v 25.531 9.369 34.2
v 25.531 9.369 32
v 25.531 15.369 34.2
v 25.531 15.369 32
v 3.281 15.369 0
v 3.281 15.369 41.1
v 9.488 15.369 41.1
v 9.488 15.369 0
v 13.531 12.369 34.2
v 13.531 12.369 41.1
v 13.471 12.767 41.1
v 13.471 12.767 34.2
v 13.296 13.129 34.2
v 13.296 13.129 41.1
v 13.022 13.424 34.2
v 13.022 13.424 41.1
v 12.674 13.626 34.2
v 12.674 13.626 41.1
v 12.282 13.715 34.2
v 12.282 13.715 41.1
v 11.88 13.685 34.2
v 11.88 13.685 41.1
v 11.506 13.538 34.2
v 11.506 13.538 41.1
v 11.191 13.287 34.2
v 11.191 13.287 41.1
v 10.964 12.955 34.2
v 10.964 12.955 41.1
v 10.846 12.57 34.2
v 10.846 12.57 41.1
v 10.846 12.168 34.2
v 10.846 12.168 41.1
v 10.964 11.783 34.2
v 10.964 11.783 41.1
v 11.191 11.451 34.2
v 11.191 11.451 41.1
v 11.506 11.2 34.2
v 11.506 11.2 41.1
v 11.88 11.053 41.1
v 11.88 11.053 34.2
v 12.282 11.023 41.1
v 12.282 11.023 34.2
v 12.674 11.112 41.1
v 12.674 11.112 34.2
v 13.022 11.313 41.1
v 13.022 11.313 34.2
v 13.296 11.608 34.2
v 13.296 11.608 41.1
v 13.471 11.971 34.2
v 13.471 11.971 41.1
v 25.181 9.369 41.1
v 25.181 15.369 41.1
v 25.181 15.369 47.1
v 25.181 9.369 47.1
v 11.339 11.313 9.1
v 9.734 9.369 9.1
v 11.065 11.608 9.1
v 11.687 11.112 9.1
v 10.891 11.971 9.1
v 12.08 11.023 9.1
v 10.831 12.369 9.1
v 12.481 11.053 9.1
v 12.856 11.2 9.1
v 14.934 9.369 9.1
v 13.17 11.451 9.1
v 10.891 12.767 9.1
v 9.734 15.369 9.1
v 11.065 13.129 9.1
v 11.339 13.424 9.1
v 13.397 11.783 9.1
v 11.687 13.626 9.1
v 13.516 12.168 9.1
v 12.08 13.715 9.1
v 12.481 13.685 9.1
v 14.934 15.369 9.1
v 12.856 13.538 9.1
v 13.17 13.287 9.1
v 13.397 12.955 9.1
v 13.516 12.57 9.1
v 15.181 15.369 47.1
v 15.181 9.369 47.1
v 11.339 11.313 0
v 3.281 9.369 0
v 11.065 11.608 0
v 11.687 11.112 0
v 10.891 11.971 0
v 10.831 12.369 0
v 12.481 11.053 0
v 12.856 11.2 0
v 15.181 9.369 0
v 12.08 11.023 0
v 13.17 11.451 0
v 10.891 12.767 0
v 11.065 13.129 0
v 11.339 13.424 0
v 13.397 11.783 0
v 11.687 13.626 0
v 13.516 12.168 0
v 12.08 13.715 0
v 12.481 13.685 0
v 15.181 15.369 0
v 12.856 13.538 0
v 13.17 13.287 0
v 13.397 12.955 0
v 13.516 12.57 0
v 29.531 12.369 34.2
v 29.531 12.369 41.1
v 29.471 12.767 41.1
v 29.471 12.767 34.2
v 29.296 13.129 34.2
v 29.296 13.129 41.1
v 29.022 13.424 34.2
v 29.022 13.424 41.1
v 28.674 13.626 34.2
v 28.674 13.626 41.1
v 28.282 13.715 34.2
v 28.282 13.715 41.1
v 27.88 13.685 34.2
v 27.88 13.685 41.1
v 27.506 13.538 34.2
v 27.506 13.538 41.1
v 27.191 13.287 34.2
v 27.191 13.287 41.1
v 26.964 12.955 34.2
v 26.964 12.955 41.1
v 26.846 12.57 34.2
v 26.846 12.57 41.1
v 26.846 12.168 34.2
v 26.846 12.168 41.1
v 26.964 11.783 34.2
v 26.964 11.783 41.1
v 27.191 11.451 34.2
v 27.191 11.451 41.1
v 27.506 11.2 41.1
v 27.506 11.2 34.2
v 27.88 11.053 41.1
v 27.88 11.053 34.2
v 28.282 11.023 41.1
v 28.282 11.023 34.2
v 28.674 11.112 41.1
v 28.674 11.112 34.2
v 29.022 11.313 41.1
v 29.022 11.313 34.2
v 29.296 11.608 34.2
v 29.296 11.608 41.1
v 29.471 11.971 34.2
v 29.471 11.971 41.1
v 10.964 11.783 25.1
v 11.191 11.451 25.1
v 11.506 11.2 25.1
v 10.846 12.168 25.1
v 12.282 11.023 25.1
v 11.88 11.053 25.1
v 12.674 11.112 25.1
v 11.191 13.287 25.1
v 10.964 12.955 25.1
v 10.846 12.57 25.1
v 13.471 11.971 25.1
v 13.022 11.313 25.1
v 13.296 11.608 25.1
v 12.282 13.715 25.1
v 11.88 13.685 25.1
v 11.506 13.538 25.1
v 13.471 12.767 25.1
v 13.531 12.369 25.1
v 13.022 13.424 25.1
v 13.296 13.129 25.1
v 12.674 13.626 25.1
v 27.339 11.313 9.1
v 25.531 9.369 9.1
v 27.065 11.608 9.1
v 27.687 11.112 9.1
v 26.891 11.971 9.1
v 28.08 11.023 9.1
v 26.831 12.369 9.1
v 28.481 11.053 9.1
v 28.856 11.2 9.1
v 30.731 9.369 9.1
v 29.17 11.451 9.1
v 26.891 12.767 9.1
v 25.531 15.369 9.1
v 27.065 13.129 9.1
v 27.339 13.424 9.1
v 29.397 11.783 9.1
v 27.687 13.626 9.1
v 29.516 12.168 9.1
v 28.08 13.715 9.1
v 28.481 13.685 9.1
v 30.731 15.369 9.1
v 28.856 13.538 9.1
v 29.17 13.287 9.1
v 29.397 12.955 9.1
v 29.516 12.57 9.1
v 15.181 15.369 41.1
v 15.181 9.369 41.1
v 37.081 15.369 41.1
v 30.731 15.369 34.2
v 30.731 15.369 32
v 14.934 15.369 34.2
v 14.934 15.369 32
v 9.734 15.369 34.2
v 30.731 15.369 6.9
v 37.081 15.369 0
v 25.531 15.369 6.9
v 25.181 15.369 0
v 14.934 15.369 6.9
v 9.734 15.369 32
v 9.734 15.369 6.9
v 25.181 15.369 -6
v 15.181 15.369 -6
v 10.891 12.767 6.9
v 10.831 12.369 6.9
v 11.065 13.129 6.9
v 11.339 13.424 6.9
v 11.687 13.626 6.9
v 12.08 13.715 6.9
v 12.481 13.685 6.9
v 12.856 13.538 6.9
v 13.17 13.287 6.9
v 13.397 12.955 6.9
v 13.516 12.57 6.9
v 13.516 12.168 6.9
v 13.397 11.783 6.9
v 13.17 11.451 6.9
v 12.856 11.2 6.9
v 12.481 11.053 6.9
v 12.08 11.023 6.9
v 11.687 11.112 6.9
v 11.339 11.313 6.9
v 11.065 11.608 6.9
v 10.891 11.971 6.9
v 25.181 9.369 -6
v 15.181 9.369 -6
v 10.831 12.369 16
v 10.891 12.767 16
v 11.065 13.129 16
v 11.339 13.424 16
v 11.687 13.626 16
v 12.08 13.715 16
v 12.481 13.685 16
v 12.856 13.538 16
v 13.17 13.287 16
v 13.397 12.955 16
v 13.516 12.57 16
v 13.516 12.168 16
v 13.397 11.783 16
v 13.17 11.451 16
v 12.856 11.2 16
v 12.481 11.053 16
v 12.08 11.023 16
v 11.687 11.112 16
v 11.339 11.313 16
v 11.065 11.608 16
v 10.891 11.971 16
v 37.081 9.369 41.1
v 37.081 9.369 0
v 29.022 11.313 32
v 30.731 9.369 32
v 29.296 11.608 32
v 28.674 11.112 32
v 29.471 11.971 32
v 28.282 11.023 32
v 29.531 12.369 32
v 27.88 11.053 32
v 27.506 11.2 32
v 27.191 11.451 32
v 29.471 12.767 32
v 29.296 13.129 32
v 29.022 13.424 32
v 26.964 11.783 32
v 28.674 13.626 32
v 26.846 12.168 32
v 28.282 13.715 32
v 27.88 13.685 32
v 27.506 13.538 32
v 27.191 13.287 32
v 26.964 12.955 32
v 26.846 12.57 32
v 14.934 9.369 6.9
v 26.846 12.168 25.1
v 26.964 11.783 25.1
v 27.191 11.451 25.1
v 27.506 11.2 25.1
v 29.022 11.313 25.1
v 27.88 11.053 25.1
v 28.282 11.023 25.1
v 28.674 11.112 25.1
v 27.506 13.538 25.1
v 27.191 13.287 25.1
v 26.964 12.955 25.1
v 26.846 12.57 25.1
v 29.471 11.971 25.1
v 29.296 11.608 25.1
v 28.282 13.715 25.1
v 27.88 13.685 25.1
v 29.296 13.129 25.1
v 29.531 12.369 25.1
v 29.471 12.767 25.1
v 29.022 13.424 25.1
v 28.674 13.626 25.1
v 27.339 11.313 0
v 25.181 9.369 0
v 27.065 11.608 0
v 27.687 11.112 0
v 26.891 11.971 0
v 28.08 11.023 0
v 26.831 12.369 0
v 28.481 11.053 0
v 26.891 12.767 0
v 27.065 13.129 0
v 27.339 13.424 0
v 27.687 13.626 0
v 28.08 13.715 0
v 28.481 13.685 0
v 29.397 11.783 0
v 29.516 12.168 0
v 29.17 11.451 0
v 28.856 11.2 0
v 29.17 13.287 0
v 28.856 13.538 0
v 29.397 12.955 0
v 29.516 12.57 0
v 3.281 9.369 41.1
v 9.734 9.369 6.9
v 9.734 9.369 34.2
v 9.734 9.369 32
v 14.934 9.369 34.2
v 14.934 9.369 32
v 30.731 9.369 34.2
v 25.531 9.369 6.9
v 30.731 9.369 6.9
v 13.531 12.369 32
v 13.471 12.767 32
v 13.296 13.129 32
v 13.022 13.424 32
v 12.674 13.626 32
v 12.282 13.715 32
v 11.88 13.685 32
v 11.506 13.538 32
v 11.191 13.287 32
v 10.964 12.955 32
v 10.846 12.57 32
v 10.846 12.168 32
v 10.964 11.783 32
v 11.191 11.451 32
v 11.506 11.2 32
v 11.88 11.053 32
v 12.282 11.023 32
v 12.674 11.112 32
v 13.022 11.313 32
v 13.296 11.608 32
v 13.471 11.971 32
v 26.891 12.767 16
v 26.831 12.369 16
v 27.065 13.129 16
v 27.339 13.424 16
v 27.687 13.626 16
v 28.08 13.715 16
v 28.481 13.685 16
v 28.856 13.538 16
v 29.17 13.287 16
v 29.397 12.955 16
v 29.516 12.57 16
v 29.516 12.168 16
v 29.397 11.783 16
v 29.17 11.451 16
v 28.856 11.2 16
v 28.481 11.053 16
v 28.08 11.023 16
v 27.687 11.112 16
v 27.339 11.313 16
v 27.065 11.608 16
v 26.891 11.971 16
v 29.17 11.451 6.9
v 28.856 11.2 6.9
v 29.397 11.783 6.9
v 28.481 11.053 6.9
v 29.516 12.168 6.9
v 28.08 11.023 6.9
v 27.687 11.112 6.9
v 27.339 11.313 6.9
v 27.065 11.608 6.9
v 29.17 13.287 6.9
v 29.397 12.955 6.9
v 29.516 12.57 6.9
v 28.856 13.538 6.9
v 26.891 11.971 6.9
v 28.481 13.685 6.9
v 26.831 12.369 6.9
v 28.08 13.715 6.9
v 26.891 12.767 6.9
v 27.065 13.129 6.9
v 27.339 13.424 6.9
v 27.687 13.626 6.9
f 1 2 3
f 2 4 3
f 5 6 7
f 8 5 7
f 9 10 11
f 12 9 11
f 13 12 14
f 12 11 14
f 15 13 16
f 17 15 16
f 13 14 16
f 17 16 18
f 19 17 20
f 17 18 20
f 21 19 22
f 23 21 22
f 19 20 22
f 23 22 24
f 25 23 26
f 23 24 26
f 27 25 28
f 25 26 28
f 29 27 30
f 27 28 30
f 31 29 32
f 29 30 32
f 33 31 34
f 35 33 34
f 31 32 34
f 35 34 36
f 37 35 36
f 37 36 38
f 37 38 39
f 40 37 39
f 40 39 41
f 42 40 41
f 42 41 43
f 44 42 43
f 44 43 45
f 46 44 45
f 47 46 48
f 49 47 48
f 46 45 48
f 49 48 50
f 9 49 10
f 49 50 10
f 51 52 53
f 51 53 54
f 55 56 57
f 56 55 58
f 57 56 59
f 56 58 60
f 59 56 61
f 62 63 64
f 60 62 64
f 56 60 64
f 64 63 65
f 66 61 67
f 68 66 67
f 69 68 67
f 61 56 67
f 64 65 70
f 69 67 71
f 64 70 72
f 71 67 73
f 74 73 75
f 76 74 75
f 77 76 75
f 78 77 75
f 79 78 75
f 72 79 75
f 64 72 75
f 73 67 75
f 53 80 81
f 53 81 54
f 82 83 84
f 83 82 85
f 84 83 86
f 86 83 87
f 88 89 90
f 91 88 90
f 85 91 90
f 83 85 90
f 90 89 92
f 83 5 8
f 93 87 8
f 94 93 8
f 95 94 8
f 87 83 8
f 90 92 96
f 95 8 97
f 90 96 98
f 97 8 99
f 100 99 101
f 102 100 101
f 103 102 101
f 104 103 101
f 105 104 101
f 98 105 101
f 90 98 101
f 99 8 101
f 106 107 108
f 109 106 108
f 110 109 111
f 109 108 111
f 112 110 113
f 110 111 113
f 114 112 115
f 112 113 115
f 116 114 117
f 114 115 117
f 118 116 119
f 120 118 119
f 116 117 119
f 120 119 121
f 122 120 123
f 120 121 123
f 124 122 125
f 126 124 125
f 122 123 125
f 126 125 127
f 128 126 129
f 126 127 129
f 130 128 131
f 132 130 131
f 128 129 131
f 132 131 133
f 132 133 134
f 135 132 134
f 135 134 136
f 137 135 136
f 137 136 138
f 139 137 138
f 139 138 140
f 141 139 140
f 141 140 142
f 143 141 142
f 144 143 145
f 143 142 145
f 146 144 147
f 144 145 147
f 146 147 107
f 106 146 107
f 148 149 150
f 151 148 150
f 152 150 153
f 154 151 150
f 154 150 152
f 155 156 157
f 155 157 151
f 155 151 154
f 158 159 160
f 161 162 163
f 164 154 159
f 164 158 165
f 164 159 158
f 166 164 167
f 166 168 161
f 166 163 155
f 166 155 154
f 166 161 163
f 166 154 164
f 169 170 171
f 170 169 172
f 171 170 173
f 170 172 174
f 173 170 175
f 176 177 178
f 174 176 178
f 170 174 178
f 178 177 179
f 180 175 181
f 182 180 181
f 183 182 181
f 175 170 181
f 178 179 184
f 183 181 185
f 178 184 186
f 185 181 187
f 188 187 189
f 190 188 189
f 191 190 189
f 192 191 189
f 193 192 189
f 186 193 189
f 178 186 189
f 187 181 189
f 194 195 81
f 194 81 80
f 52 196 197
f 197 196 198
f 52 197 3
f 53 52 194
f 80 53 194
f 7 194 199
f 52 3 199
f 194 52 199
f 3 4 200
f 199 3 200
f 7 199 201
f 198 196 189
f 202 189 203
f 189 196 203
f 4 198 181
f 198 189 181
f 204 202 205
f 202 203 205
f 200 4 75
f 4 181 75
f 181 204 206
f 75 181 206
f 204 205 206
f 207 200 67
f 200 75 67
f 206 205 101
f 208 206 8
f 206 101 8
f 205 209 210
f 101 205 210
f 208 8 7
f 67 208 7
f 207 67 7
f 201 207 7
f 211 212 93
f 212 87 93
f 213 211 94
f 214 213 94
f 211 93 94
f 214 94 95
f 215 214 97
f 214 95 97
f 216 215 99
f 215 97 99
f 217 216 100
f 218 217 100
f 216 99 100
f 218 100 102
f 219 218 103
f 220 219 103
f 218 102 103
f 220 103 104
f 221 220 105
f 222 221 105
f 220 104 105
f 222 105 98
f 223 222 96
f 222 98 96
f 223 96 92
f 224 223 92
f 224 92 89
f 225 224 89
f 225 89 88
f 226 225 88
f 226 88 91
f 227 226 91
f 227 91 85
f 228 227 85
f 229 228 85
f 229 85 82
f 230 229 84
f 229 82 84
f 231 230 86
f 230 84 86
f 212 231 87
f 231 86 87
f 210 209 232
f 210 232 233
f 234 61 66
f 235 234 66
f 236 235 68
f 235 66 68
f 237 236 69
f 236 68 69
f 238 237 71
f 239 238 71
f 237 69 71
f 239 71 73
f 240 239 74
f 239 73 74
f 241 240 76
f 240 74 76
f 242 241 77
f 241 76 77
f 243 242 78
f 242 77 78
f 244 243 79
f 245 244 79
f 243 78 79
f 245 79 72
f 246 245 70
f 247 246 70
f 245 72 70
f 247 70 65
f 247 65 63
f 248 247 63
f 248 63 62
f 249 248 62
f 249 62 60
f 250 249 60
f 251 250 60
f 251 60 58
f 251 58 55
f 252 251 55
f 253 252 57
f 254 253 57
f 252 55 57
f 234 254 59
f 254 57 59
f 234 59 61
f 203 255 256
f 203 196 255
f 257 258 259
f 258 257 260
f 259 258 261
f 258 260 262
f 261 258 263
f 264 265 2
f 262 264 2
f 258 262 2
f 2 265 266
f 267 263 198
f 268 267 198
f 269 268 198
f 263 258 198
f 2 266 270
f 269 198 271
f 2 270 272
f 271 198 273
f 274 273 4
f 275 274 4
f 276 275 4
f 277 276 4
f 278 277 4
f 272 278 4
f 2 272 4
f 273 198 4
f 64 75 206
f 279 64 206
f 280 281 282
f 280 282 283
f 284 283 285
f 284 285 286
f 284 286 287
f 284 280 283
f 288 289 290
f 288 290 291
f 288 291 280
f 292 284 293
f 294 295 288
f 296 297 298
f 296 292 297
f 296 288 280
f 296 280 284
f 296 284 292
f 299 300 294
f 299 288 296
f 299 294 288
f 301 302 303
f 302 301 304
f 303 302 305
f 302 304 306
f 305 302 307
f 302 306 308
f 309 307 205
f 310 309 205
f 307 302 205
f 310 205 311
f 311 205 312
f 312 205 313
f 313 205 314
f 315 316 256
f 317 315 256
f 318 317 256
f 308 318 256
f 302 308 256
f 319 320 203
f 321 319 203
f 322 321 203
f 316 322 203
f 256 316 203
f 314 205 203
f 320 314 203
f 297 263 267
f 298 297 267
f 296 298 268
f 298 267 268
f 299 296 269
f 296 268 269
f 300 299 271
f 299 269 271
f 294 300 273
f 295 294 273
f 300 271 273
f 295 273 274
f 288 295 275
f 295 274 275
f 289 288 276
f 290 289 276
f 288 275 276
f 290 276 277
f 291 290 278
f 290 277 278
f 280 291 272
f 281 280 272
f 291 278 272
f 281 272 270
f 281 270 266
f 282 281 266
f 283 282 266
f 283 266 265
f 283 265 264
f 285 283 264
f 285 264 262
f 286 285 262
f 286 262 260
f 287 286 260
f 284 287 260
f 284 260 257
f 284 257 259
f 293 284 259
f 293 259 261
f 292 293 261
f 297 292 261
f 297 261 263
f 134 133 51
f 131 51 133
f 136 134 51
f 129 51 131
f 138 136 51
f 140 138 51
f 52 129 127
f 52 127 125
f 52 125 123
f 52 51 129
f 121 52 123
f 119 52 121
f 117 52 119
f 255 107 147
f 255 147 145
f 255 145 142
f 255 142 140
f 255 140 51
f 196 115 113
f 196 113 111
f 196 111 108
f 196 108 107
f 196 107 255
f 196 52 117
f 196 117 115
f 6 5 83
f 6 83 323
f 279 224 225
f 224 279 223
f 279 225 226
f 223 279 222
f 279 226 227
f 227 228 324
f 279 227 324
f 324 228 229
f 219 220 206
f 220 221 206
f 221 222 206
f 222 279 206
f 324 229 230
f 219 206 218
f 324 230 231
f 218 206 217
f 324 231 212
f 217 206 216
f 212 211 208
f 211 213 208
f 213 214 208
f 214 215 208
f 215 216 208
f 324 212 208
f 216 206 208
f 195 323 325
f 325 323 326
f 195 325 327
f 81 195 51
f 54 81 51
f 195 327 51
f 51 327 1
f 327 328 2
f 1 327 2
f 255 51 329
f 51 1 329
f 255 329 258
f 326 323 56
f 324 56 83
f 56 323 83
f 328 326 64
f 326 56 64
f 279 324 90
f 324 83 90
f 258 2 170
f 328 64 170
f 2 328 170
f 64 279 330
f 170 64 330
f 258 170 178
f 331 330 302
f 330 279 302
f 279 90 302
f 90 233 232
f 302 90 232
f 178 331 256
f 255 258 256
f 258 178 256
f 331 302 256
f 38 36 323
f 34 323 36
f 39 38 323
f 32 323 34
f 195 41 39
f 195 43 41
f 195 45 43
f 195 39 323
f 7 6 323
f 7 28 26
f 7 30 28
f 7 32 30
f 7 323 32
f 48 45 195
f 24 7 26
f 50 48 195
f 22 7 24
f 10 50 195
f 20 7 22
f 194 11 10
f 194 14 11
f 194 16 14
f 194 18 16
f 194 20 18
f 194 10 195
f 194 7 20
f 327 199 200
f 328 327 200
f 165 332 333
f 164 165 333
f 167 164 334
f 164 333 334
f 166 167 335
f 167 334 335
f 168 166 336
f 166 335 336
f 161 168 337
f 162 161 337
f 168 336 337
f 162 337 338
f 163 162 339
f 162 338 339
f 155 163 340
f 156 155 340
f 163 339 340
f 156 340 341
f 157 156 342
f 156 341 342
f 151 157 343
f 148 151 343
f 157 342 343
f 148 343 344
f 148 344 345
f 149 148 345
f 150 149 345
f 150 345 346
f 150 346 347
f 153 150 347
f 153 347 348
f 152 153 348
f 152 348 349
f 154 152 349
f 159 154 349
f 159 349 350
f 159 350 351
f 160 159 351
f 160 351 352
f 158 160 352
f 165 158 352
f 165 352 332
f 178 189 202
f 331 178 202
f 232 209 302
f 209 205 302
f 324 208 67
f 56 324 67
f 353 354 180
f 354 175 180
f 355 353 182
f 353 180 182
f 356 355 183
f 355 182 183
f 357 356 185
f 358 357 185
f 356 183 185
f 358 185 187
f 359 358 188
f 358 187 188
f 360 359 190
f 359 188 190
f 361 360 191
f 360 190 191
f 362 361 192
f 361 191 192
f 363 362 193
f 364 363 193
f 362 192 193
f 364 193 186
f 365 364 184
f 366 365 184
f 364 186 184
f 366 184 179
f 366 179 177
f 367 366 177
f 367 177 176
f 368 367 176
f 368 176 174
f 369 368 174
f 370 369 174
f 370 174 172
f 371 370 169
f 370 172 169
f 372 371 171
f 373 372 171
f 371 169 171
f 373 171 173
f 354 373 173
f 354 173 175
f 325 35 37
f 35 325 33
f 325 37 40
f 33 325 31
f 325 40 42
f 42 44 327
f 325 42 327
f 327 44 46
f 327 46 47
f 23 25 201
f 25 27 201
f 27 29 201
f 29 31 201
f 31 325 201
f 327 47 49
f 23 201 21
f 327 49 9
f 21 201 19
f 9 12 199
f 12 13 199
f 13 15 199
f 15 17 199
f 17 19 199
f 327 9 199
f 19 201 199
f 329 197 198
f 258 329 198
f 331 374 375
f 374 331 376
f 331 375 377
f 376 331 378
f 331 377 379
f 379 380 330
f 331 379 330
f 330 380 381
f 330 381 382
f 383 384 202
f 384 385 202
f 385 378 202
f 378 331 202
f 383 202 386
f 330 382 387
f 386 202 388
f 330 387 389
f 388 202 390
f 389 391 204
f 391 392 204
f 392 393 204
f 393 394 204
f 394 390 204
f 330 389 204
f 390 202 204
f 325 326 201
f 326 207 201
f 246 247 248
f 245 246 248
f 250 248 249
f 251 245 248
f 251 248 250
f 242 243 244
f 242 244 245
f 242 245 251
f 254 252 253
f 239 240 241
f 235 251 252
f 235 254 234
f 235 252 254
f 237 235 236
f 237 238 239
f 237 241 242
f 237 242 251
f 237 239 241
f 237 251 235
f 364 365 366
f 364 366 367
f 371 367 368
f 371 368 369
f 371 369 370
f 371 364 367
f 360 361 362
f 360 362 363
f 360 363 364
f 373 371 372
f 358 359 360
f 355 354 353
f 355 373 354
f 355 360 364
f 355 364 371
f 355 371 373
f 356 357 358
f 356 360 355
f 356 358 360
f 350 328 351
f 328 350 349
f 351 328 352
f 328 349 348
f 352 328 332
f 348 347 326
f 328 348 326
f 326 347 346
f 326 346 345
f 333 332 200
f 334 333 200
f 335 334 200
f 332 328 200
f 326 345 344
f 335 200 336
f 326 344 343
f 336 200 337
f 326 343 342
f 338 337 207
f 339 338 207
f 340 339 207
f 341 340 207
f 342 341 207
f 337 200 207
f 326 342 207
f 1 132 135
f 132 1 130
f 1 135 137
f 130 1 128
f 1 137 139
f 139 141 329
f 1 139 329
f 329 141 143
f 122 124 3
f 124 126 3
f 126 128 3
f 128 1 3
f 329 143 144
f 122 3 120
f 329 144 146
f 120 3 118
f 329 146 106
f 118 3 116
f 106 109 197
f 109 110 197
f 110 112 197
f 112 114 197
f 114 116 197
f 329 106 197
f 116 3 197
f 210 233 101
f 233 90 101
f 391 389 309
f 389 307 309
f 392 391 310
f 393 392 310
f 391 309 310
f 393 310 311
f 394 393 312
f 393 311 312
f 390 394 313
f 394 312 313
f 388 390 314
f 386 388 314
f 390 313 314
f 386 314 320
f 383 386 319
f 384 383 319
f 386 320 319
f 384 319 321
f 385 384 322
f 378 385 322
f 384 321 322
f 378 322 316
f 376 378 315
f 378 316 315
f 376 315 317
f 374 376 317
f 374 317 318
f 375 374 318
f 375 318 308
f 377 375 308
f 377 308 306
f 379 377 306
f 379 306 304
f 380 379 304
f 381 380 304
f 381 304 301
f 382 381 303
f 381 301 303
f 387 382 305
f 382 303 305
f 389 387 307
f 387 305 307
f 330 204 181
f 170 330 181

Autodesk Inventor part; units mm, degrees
ref_plane "YZ Plane" through (0, 0, 0) normal (1, 0, 0) x (0, 1, 0)
ref_plane "XZ Plane" through (0, 0, 0) normal (0, 1, 0) x (-1, 0, 0)
ref_plane "XY Plane" through (0, 0, 0) normal (0, 0, 1) x (1, 0, 0)
sketch "스케치8" plane through (0, 0, 0) normal (0, 0, 1) x (1, 0, 0)
  circle A0 centre (12.1807, -22.6311) radius 1.2
  arc A1 (9.2807, -22.6311) -> (14.3807, -22.6311) centre (11.8307, -22.1236) ccw
  circle A2 centre (14.5238, -16.9742) radius 1.2
  circle A3 centre (20.1807, -14.6311) radius 1.2
  circle A4 centre (25.8375, -16.9742) radius 1.2
  circle A5 centre (28.1807, -22.6311) radius 1.2
  arc A6 (25.9807, -22.6311) -> (31.0807, -22.6311) centre (28.5307, -22.1236) ccw
  line L0 (9.2807, -22.6311) -> (31.0807, -22.6311)
  line L1 (9.2807, -2.6311) -> (9.2807, -22.6311)
  line L2 (31.0807, -22.6311) -> (31.0807, -2.6311)
  circle A7 centre (20.1807, -22.6311) radius 5.8
  line L3 (9.2807, -2.6311) -> (39.0379, -2.6311) construction
  line L4 (31.0807, -2.6311) -> (31.0807, 12.3689)
  line L5 (31.0807, 12.3689) -> (9.2807, 12.3689)
  line L6 (9.2807, 12.3689) -> (9.2807, -2.6311)
  line L7 (9.2807, 12.3689) -> (9.2807, 12.3689)
  line L8 (31.0807, 12.3689) -> (31.0807, 12.3689)
  line L9 (31.0807, 12.3689) -> (46.4956, 27.7838)
  arc A8 (46.4956, 27.7838) -> (9.2807, 12.3689) centre (31.0807, 12.3689) ccw
  arc A9 (15.2617, -2.6311) -> (15.6657, -3.046) centre (31.0807, 12.3689) ccw
  line L10 (15.1807, 15.3689) -> (25.1807, 15.3689)
  line L11 (25.1807, 15.3689) -> (25.1807, 9.3689)
  line L12 (25.1807, 9.3689) -> (15.1807, 9.3689)
  line L13 (15.1807, 9.3689) -> (15.1807, 15.3689)
  line L14 (15.1807, 15.3689) -> (25.1807, 9.3689) construction
  line L15 (25.1807, 15.3689) -> (15.1807, 9.3689) construction
  circle A10 centre (12.1807, 12.3689) radius 1.35
  circle A11 centre (28.1807, 12.3689) radius 1.35
  line L16 (9.2807, -2.6311) -> (31.0807, -2.6311)
  circle A12 centre (9.2807, 12.3689) radius 21.8
  line L17 (9.2807, 4.8689) -> (31.0807, 4.8689)
  line L18 (31.0807, 4.8689) -> (31.0807, 19.8689)
  line L19 (31.0807, 19.8689) -> (9.2807, 19.8689)
  line L20 (9.2807, 19.8689) -> (9.2807, 4.8689)
  line L21 (9.2807, 4.8689) -> (31.0807, 19.8689) construction
  line L22 (31.0807, 4.8689) -> (9.2807, 19.8689) construction
  line L23 (31.0807, 15.3689) -> (9.2807, 15.3689)
  line L24 (9.2807, 15.3689) -> (9.2807, 9.3689)
  line L25 (9.2807, 9.3689) -> (31.0807, 9.3689)
  line L26 (31.0807, 9.3689) -> (31.0807, 15.3689)
  line L27 (31.0807, 15.3689) -> (9.2807, 9.3689) construction
  line L28 (9.2807, 15.3689) -> (31.0807, 9.3689) construction
  point P0 (0, 0)
  point P1 (-60.3663, -40.6069)
  point P2 (20.1807, -22.6311)
  point P3 (20.1807, -22.6311)
  point P4 (14.3807, -22.6311)
  point P5 (14.3807, -22.6311)
  point P6 (9.2807, 17.3689)
  point P7 (25.0996, -2.6311)
  point P8 (9.2807, -9.4311)
  point P9 (20.1807, 12.3689)
  point P10 (29.7499, 19.8689)
  point P11 (10.6114, 19.8689)
  point P12 (30.8733, 15.3689)
  point P13 (9.4881, 15.3689)
  dimension "d31" = 2.6
  dimension "d32" = 2.6
  dimension "d33" = 20
  dimension "d34" = 15
  dimension "d35" = 0
  dimension "d36" = 0
  dimension "d38" = 135
  dimension "d39" = 10
  dimension "d40" = 6
  dimension "d44" = 2.7
  dimension "d45" = 2.7
  dimension "d48" = 15
extrude "돌출8" add sketch "스케치8" along normal blind 41.1 contours L6 L5 A10 L13 L25 | A12 L25 L11 L5 A11 | L5 A11 L11 L23 A12 | L4 L25 A12 | L23 L13 L5 A10 A8 | L13 L5 L11 L12 | A11 L5 | L5 A11 | L10 L11 L5 L13 | A10 L5 | L5 A10
sketch "스케치9" plane through (0, 0, 41.1) normal (0, 0, 1) x (1, 0, 0)
  line L0 (30.8733, 15.3689) -> (9.4881, 15.3689) projected
  line L1 (30.8733, 15.3689) -> (9.4881, 15.3689) projected
  arc A0 (9.4881, 15.3689) -> (9.2807, 12.3689) centre (31.0807, 12.3689) ccw projected
  arc A1 (9.4881, 15.3689) -> (9.2807, 12.3689) centre (31.0807, 12.3689) ccw projected
  line L2 (9.2807, 12.3689) -> (9.2807, 9.3689) projected
  line L3 (9.2807, 12.3689) -> (9.2807, 9.3689) projected
  line L4 (9.2807, 9.3689) -> (31.0807, 9.3689) projected
  line L5 (9.2807, 9.3689) -> (31.0807, 9.3689) projected
  line L6 (31.0807, 9.3689) -> (31.0807, 12.3689) projected
  line L7 (31.0807, 9.3689) -> (31.0807, 12.3689) projected
  arc A2 (31.0807, 12.3689) -> (30.8733, 15.3689) centre (9.2807, 12.3689) ccw projected
  arc A3 (31.0807, 12.3689) -> (30.8733, 15.3689) centre (9.2807, 12.3689) ccw projected
  line L8 (30.8733, 15.3689) -> (9.4881, 15.3689) projected
  arc A4 (31.0807, 12.3689) -> (30.8733, 15.3689) centre (9.2807, 12.3689) ccw projected
  line L9 (31.0807, 9.3689) -> (31.0807, 12.3689) projected
  line L10 (9.2807, 9.3689) -> (31.0807, 9.3689) projected
  line L11 (9.2807, 12.3689) -> (9.2807, 9.3689) projected
  arc A5 (9.4881, 15.3689) -> (9.2807, 12.3689) centre (31.0807, 12.3689) ccw projected
  line L12 (30.8733, 15.3689) -> (9.4881, 15.3689) projected
  arc A6 (9.4881, 15.3689) -> (9.2807, 12.3689) centre (31.0807, 12.3689) ccw projected
  line L13 (9.2807, 12.3689) -> (9.2807, 9.3689) projected
  line L14 (9.2807, 9.3689) -> (31.0807, 9.3689) projected
  line L15 (31.0807, 9.3689) -> (31.0807, 12.3689) projected
  arc A7 (31.0807, 12.3689) -> (30.8733, 15.3689) centre (9.2807, 12.3689) ccw projected
  line L16 (30.8733, 15.3689) -> (9.4881, 15.3689) projected
  line L17 (30.8733, 15.3689) -> (9.4881, 15.3689) projected
  arc A8 (9.4881, 15.3689) -> (9.2807, 12.3689) centre (31.0807, 12.3689) ccw projected
  arc A9 (9.4881, 15.3689) -> (9.2807, 12.3689) centre (31.0807, 12.3689) ccw projected
  line L18 (9.2807, 12.3689) -> (9.2807, 9.3689) projected
  line L19 (9.2807, 12.3689) -> (9.2807, 9.3689) projected
  line L20 (9.2807, 9.3689) -> (31.0807, 9.3689) projected
  line L21 (9.2807, 9.3689) -> (31.0807, 9.3689) projected
  line L22 (31.0807, 9.3689) -> (31.0807, 12.3689) projected
  line L23 (31.0807, 9.3689) -> (31.0807, 12.3689) projected
  arc A10 (31.0807, 12.3689) -> (30.8733, 15.3689) centre (9.2807, 12.3689) ccw projected
  arc A11 (31.0807, 12.3689) -> (30.8733, 15.3689) centre (9.2807, 12.3689) ccw projected
  circle A12 centre (36.2473, 1.0351) radius 1.2
  arc A13 (33.3473, 1.0351) -> (38.4473, 1.0351) centre (35.8973, 1.5425) ccw
  circle A14 centre (38.5905, 6.6919) radius 1.2
  circle A15 centre (44.2473, 9.0351) radius 1.2
  circle A16 centre (49.9042, 6.6919) radius 1.2
  circle A17 centre (52.2473, 1.0351) radius 1.2
  arc A18 (50.0473, 1.0351) -> (55.1473, 1.0351) centre (52.5973, 1.5425) ccw
  line L24 (33.3473, 1.0351) -> (55.1473, 1.0351)
  line L25 (33.3473, 21.0351) -> (33.3473, 1.0351)
  line L26 (55.1473, 1.0351) -> (55.1473, 21.0351)
  circle A19 centre (44.2473, 1.0351) radius 5.8
  line L27 (33.3473, 21.0351) -> (63.1045, 21.0351) construction
  line L28 (55.1473, 21.0351) -> (55.1473, 36.0351)
  line L29 (55.1473, 36.0351) -> (33.3473, 36.0351)
  line L30 (33.3473, 36.0351) -> (33.3473, 21.0351)
  line L31 (33.3473, 36.0351) -> (33.3473, 36.0351)
  line L32 (55.1473, 36.0351) -> (55.1473, 36.0351)
  line L33 (55.1473, 36.0351) -> (70.5623, 51.45)
  arc A20 (70.5623, 51.45) -> (33.3473, 36.0351) centre (55.1473, 36.0351) ccw
  arc A21 (39.3284, 21.0351) -> (39.7324, 20.6202) centre (55.1473, 36.0351) ccw
  line L34 (39.2473, 39.0351) -> (49.2473, 39.0351)
  line L35 (49.2473, 39.0351) -> (49.2473, 33.0351)
  line L36 (49.2473, 33.0351) -> (39.2473, 33.0351)
  line L37 (39.2473, 33.0351) -> (39.2473, 39.0351)
  line L38 (39.2473, 39.0351) -> (49.2473, 33.0351) construction
  line L39 (49.2473, 39.0351) -> (39.2473, 33.0351) construction
  circle A22 centre (36.2473, 36.0351) radius 1.35
  circle A23 centre (52.2473, 36.0351) radius 1.35
  line L40 (33.3473, 21.0351) -> (55.1473, 21.0351)
  circle A24 centre (33.3473, 36.0351) radius 21.8
  line L41 (33.3473, 28.5351) -> (55.1473, 28.5351)
  line L42 (55.1473, 28.5351) -> (55.1473, 43.5351)
  line L43 (55.1473, 43.5351) -> (33.3473, 43.5351)
  line L44 (33.3473, 43.5351) -> (33.3473, 28.5351)
  line L45 (33.3473, 28.5351) -> (55.1473, 43.5351) construction
  line L46 (55.1473, 28.5351) -> (33.3473, 43.5351) construction
  line L47 (55.1473, 39.0351) -> (33.3473, 39.0351)
  line L48 (33.3473, 39.0351) -> (33.3473, 33.0351)
  line L49 (33.3473, 33.0351) -> (55.1473, 33.0351)
  line L50 (55.1473, 33.0351) -> (55.1473, 39.0351)
  line L51 (55.1473, 39.0351) -> (33.3473, 33.0351) construction
  line L52 (33.3473, 39.0351) -> (55.1473, 33.0351) construction
  line L53 (15.1807, 15.3689) -> (25.1807, 15.3689)
  line L54 (25.1807, 15.3689) -> (25.1807, 9.3689)
  line L55 (25.1807, 9.3689) -> (15.1807, 9.3689)
  line L56 (15.1807, 9.3689) -> (15.1807, 15.3689)
  line L57 (15.1807, 15.3689) -> (25.1807, 9.3689) construction
  line L58 (25.1807, 15.3689) -> (15.1807, 9.3689) construction
  line L59 (15.1807, 12.3689) -> (12.1807, 12.3689)
  circle A25 centre (12.1807, 12.3689) radius 1.35
  line L60 (25.1807, 12.3689) -> (28.1807, 12.3689)
  circle A26 centre (28.1807, 12.3689) radius 1.35
  point P0 (0, 0)
  point P1 (24.0667, 23.6662)
  point P2 (-36.2996, -16.9407)
  point P3 (44.2473, 1.0351)
  point P4 (44.2473, 1.0351)
  point P5 (38.4473, 1.0351)
  point P6 (38.4473, 1.0351)
  point P7 (33.3473, 41.0351)
  point P8 (49.1663, 21.0351)
  point P9 (33.3473, 14.2351)
  point P10 (44.2473, 36.0351)
  point P11 (53.8166, 43.5351)
  point P12 (34.6781, 43.5351)
  point P13 (54.9399, 39.0351)
  point P14 (33.5547, 39.0351)
  point P15 (20.1807, 12.3689)
  dimension "d49" = 2.6
  dimension "d50" = 2.6
  dimension "d51" = 20
  dimension "d52" = 15
  dimension "d53" = 0
  dimension "d54" = 0
  dimension "d55" = 135
  dimension "d56" = 10
  dimension "d57" = 6
  dimension "d58" = 2.7
  dimension "d59" = 2.7
  dimension "d60" = 15
  dimension "d61" = 10
  dimension "d62" = 5.9
  dimension "d64" = 3
  dimension "d65" = 2.7
  dimension "d66" = 3
  dimension "d67" = 2.7
extrude "돌출9" cut sketch "스케치9" against normal blind 16 contours A26 | A25
sketch "스케치10" plane through (0, 0, 41.1) normal (0, 0, 1) x (1, 0, 0)
  circle A0 centre (12.1807, 12.3689) radius 1.35 projected
  circle A1 centre (28.1807, 12.3689) radius 1.35 projected
  line L0 (30.8733, 15.3689) -> (9.4881, 15.3689) projected
  arc A2 (9.4881, 15.3689) -> (9.2807, 12.3689) centre (31.0807, 12.3689) ccw projected
  line L1 (9.2807, 12.3689) -> (9.2807, 9.3689) projected
  line L2 (9.2807, 9.3689) -> (31.0807, 9.3689) projected
  line L3 (31.0807, 9.3689) -> (31.0807, 12.3689) projected
  arc A3 (31.0807, 12.3689) -> (30.8733, 15.3689) centre (9.2807, 12.3689) ccw projected
  line L4 (15.1807, 15.3689) -> (25.1807, 15.3689)
  line L5 (25.1807, 15.3689) -> (25.1807, 9.3689)
  line L6 (25.1807, 9.3689) -> (15.1807, 9.3689)
  line L7 (15.1807, 9.3689) -> (15.1807, 15.3689)
  line L8 (15.1807, 15.3689) -> (25.1807, 9.3689) construction
  line L9 (25.1807, 15.3689) -> (15.1807, 9.3689) construction
  point P0 (0, 0)
  point P1 (20.1807, 12.3689)
  dimension "d70" = 10
extrude "돌출10" add sketch "스케치10" along normal blind 6 contours L5 L2 L7 L0
sketch "스케치11" plane through (0, 0, 0) normal (0, 0, -1) x (-1, 0, 0)
  line L0 (-30.8733, 15.3689) -> (-9.4881, 15.3689) projected
  arc A0 (-30.8733, 15.3689) -> (-31.0807, 12.3689) centre (-9.2807, 12.3689) ccw projected
  line L1 (-31.0807, 9.3689) -> (-31.0807, 12.3689) projected
  line L2 (-9.2807, 9.3689) -> (-31.0807, 9.3689) projected
  line L3 (-9.2807, 12.3689) -> (-9.2807, 9.3689) projected
  arc A1 (-9.2807, 12.3689) -> (-9.4881, 15.3689) centre (-31.0807, 12.3689) ccw projected
  line L4 (-25.1807, 15.3689) -> (-25.1807, 9.3689) projected
  line L5 (-15.1807, 9.3689) -> (-15.1807, 15.3689) projected
  point P0 (0, 0)
extrude "돌출11" add sketch "스케치11" along normal blind 6 contours L0 L5 L2 L4
sketch "스케치12" plane through (0, 0, 0) normal (0, 0, -1) x (-1, 0, 0)
  circle A0 centre (-28.1807, 12.3689) radius 1.35 projected
  circle A1 centre (-12.1807, 12.3689) radius 1.35 projected
  point P0 (0, 0)
extrude "돌출12" cut sketch "스케치12" against normal blind 16
sketch "스케치13" plane through (9.4881, 15.3689, 41.1) normal (0, 1, 0) x (1, 0, 0)
  line L0 (17.3426, 41.1) -> (20.0426, 41.1) projected
  line L1 (17.3426, 25.1) -> (20.0426, 25.1) projected
  line L2 (21.3852, 0) -> (15.6926, 0) projected
  line L3 (15.6926, 0) -> (21.5926, 0) projected
  line L4 (15.6926, 0) -> (21.5926, 0) projected
  line L5 (21.5926, 0) -> (21.3852, 0) projected
  line L6 (21.3852, 0) -> (15.6926, 0) projected
  line L7 (20.0426, 0) -> (17.3426, 0) projected
  line L8 (15.6926, 0) -> (15.6926, -6) projected
  line L9 (15.6926, 0) -> (15.6926, -6) projected
  line L10 (15.6926, 0) -> (15.6926, -6) projected
  line L11 (15.6926, 0) -> (15.6926, -6) projected
  line L12 (4.0426, 16) -> (1.3426, 16) projected
  line L13 (4.0426, 16) -> (1.3426, 16) projected
  line L14 (4.0426, 16) -> (1.3426, 16) projected
  line L15 (4.0426, 0) -> (1.3426, 0) projected
  line L16 (5.6926, 0) -> (5.6926, -6) projected
  line L17 (5.6926, -6) -> (15.6926, -6) projected
  line L18 (15.6926, -6) -> (5.6926, -6) projected
  line L19 (5.6926, 0) -> (5.6926, -6) projected
  line L20 (5.6926, 0) -> (5.6926, -6) projected
  line L21 (1.3426, 25.1) -> (4.0426, 25.1) projected
  line L22 (21.5926, 41.1) -> (21.5926, 0) projected
  line L23 (21.3852, 41.1) -> (21.3852, 0) projected
  line L24 (21.5926, 41.1) -> (21.3852, 41.1) projected
  line L25 (21.3852, 41.1) -> (21.3852, 0) projected
  line L26 (21.5926, 0) -> (21.3852, 0) projected
  line L27 (21.5926, 41.1) -> (21.5926, 0) projected
  line L28 (21.5926, 41.1) -> (21.5926, 0) projected
  line L29 (21.5926, 41.1) -> (21.5926, 0) projected
  line L30 (21.5926, 41.1) -> (21.5926, 0) projected
  line L31 (21.3852, 41.1) -> (15.6926, 41.1) projected
  line L32 (15.6926, 41.1) -> (15.6926, 47.1) projected
  line L33 (5.6926, 47.1) -> (15.6926, 47.1) projected
  line L34 (5.6926, 41.1) -> (5.6926, 47.1) projected
  line L35 (5.6926, 41.1) -> (0, 41.1) projected
  line L36 (0, 41.1) -> (0, 0) projected
  line L37 (5.6926, 0) -> (0, 0) projected
  line L38 (5.6926, 0) -> (5.6926, -6) projected
  line L39 (15.6926, -6) -> (5.6926, -6) projected
  line L40 (15.6926, 0) -> (15.6926, -6) projected
  line L41 (21.3852, 0) -> (15.6926, 0) projected
  line L42 (21.3852, 41.1) -> (21.3852, 0) projected
  line L43 (-0.2074, 41.1) -> (5.6926, 41.1) projected
  line L44 (5.6926, 41.1) -> (5.6926, 47.1) projected
  line L45 (15.6926, 47.1) -> (5.6926, 47.1) projected
  line L46 (15.6926, 41.1) -> (15.6926, 47.1) projected
  line L47 (15.6926, 41.1) -> (21.5926, 41.1) projected
  line L48 (21.5926, 41.1) -> (21.5926, 0) projected
  line L49 (15.6926, 0) -> (21.5926, 0) projected
  line L50 (15.6926, 0) -> (15.6926, -6) projected
  line L51 (5.6926, -6) -> (15.6926, -6) projected
  line L52 (5.6926, 0) -> (5.6926, -6) projected
  line L53 (-0.2074, 0) -> (5.6926, 0) projected
  line L54 (-0.2074, 41.1) -> (-0.2074, 0) projected
  line L55 (1.3426, 41.1) -> (4.0426, 41.1) projected
  line L56 (0, 41.1) -> (0, 0) projected
  line L57 (0, 41.1) -> (-0.2074, 41.1) projected
  line L58 (-0.2074, 41.1) -> (-0.2074, 0) projected
  line L59 (0, 0) -> (-0.2074, 0) projected
  line L60 (0, 41.1) -> (0, 0) projected
  line L61 (-0.2074, 41.1) -> (-0.2074, 0) projected
  line L62 (-0.2074, 41.1) -> (-0.2074, 0) projected
  line L63 (-0.2074, 41.1) -> (-0.2074, 0) projected
  line L64 (-0.2074, 41.1) -> (-0.2074, 0) projected
  line L65 (20.0426, 0) -> (17.3426, 0) projected
  line L66 (20.0426, 16) -> (17.3426, 16) projected
  line L67 (20.0426, 16) -> (17.3426, 16) projected
  line L68 (20.0426, 16) -> (17.3426, 16) projected
  line L69 (20.0426, 0) -> (17.3426, 0) projected
  line L70 (21.3852, 0) -> (21.5926, 0) projected
  line L71 (15.6926, -6) -> (5.6926, -6) projected
  line L72 (-0.2074, 0) -> (5.6926, 0) projected
  line L73 (4.0426, 0) -> (1.3426, 0) projected
  line L74 (5.6926, 0) -> (0, 0) projected
  line L75 (-0.2074, 0) -> (0, 0) projected
  line L76 (5.6926, 0) -> (0, 0) projected
  line L77 (0, 0) -> (-0.2074, 0) projected
  line L78 (-0.2074, 0) -> (5.6926, 0) projected
  line L79 (4.0426, 0) -> (1.3426, 0) projected
  line L80 (5.6926, 0) -> (5.6926, -6) projected
  line L81 (5.6926, -6) -> (15.6926, -6) projected
  line L82 (-0.2074, 41.1) -> (5.6926, 41.1) projected
  line L83 (21.3852, 41.1) -> (15.6926, 41.1) projected
  line L84 (21.3852, 41.1) -> (21.5926, 41.1) projected
  line L85 (15.6926, 41.1) -> (21.5926, 41.1) projected
  line L86 (15.6926, 47.1) -> (5.6926, 47.1) projected
  line L87 (17.3426, 25.1) -> (20.0426, 25.1) projected
  line L88 (1.3426, 25.1) -> (4.0426, 25.1) projected
  line L89 (17.3426, 25.1) -> (20.0426, 25.1) projected
  line L90 (17.3426, 41.1) -> (20.0426, 41.1) projected
  line L91 (1.3426, 25.1) -> (4.0426, 25.1) projected
  line L92 (1.3426, 41.1) -> (4.0426, 41.1) projected
  line L93 (17.3426, 41.1) -> (20.0426, 41.1) projected
  line L94 (21.3852, 41.1) -> (15.6926, 41.1) projected
  line L95 (21.5926, 41.1) -> (21.3852, 41.1) projected
  line L96 (15.6926, 41.1) -> (21.5926, 41.1) projected
  line L97 (-0.2074, 41.1) -> (0, 41.1) projected
  line L98 (1.3426, 41.1) -> (4.0426, 41.1) projected
  line L99 (-0.2074, 41.1) -> (5.6926, 41.1) projected
  line L100 (0, 41.1) -> (-0.2074, 41.1) projected
  line L101 (5.6926, 41.1) -> (0, 41.1) projected
  line L102 (5.6926, 41.1) -> (0, 41.1) projected
  line L103 (5.6926, 47.1) -> (15.6926, 47.1) projected
  line L104 (5.6926, 41.1) -> (5.6926, 47.1) projected
  line L105 (5.6926, 41.1) -> (5.6926, 47.1) projected
  line L106 (5.6926, 47.1) -> (15.6926, 47.1) projected
  line L107 (15.6926, 47.1) -> (5.6926, 47.1) projected
  line L108 (5.6926, 41.1) -> (5.6926, 47.1) projected
  line L109 (5.6926, 41.1) -> (5.6926, 47.1) projected
  line L110 (15.6926, 41.1) -> (15.6926, 47.1) projected
  line L111 (15.6926, 41.1) -> (15.6926, 47.1) projected
  line L112 (15.6926, 41.1) -> (15.6926, 47.1) projected
  line L113 (15.6926, 41.1) -> (15.6926, 47.1) projected
  line L114 (17.3426, 41.1) -> (17.3426, 25.1) projected
  line L115 (20.0426, 41.1) -> (20.0426, 25.1) projected
  line L116 (4.0426, 41.1) -> (4.0426, 25.1) projected
  line L117 (1.3426, 41.1) -> (1.3426, 25.1) projected
  line L118 (4.0426, 0) -> (4.0426, 16) projected
  line L119 (1.3426, 0) -> (1.3426, 16) projected
  line L120 (17.3426, 0) -> (17.3426, 16) projected
  line L121 (20.0426, 0) -> (20.0426, 16) projected
  line L122 (0.2463, 32) -> (5.4463, 32)
  line L123 (5.4463, 32) -> (5.4463, 34.2)
  line L124 (5.4463, 34.2) -> (0.2463, 34.2)
  line L125 (0.2463, 34.2) -> (0.2463, 32)
  line L126 (0.2463, 32) -> (5.4463, 34.2) construction
  line L127 (5.4463, 32) -> (0.2463, 34.2) construction
  line L128 (16.0426, 32) -> (21.2426, 32)
  line L129 (21.2426, 32) -> (21.2426, 34.2)
  line L130 (21.2426, 34.2) -> (16.0426, 34.2)
  line L131 (16.0426, 34.2) -> (16.0426, 32)
  line L132 (16.0426, 32) -> (21.2426, 34.2) construction
  line L133 (21.2426, 32) -> (16.0426, 34.2) construction
  line L134 (16.0426, 6.9) -> (21.2426, 6.9)
  line L135 (21.2426, 6.9) -> (21.2426, 9.1)
  line L136 (21.2426, 9.1) -> (16.0426, 9.1)
  line L137 (16.0426, 9.1) -> (16.0426, 6.9)
  line L138 (16.0426, 6.9) -> (21.2426, 9.1) construction
  line L139 (21.2426, 6.9) -> (16.0426, 9.1) construction
  line L140 (0.2463, 6.9) -> (5.4463, 6.9)
  line L141 (5.4463, 6.9) -> (5.4463, 9.1)
  line L142 (5.4463, 9.1) -> (0.2463, 9.1)
  line L143 (0.2463, 9.1) -> (0.2463, 6.9)
  line L144 (0.2463, 6.9) -> (5.4463, 9.1) construction
  line L145 (5.4463, 6.9) -> (0.2463, 9.1) construction
  point P0 (-9.4881, 41.1)
  point P1 (2.8463, 33.1)
  point P2 (18.6426, 33.1)
  point P3 (18.6426, 8)
  point P4 (2.8463, 8)
  dimension "d77" = 5.2
  dimension "d78" = 2.2
  dimension "d79" = 5.2
  dimension "d80" = 2.2
  dimension "d81" = 5.2
  dimension "d82" = 2.2
  dimension "d83" = 5.2
  dimension "d84" = 2.2
extrude "돌출13" cut sketch "스케치13" against normal blind 10 contours L130 L115 L128 L114 | L114 L128 L131 L130 | L130 L129 L128 L115 | L134 L120 L136 L121 | L121 L136 L135 L134 | L134 L137 L136 L120 | L124 L123 L122 L116 | L116 L122 L117 L124 | L117 L122 L125 L124 | L140 L143 L142 L119 | L119 L142 L118 L140 | L118 L142 L141 L140
sketch "스케치14" plane through (9.2807, 9.3689, 0) normal (-1, 0, 0) x (0, 0, 1)
  line L0 (0, 6) -> (0, 3) projected
  line L1 (0, 3) -> (41.1, 3) projected
  line L2 (41.1, 6) -> (41.1, 3) projected
  line L3 (0, 6) -> (41.1, 6) projected
  line L4 (0, 3) -> (0, 0) projected
  line L5 (0, 0) -> (41.1, 0) projected
  line L6 (41.1, 3) -> (41.1, 0) projected
  line L7 (0, 3) -> (41.1, 3) projected
  line L8 (0, 0) -> (0, 6) projected
  line L9 (41.1, 0) -> (47.1, 0) projected
  line L10 (0, 6) -> (41.1, 6)
  line L11 (41.1, 6) -> (41.1, 0)
  line L12 (41.1, 0) -> (0, 0)
  line L13 (0, 0) -> (0, 6)
  point P0 (0, -9.3689)
extrude "돌출14" add sketch "스케치14" along normal blind 6
sketch "스케치15" plane through (31.0807, 9.3689, 0) normal (1, 0, 0) x (0, 0, -1)
  line L0 (-32, 1.65) -> (-25.1, 1.65) projected
  line L1 (0, 0) -> (0, 3) projected
  line L2 (0, 3) -> (-41.1, 3) projected
  line L3 (-41.1, 0) -> (-41.1, 3) projected
  line L4 (0, 0) -> (-41.1, 0) projected
  line L5 (0, 3) -> (0, 6) projected
  line L6 (0, 6) -> (-41.1, 6) projected
  line L7 (-41.1, 3) -> (-41.1, 6) projected
  line L8 (0, 3) -> (-41.1, 3) projected
  point P0 (0, -9.3689)
extrude "돌출15" add sketch "스케치15" along normal blind 6
sketch "스케치16" plane through (9.4881, 15.3689, 41.1) normal (0, 1, 0) x (1, 0, 0)
  line L0 (-0.2074, 0) -> (-0.2074, 41.1) projected
  line L1 (-0.2074, 41.1) -> (-6.2074, 41.1) projected
  line L2 (-6.2074, 0) -> (-6.2074, 41.1) projected
  line L3 (-0.2074, 0) -> (-6.2074, 0) projected
  line L4 (5.4463, 34.2) -> (5.4463, 32) projected
  line L5 (5.4463, 32) -> (0.2463, 32) projected
  line L6 (0.2463, 32) -> (0.2463, 34.2) projected
  line L7 (0.2463, 34.2) -> (5.4463, 34.2) projected
  line L8 (21.2426, 9.1) -> (21.2426, 6.9) projected
  line L9 (21.2426, 6.9) -> (16.0426, 6.9) projected
  line L10 (16.0426, 6.9) -> (16.0426, 9.1) projected
  line L11 (16.0426, 9.1) -> (21.2426, 9.1) projected
  line L12 (21.2426, 34.2) -> (21.2426, 32) projected
  line L13 (21.2426, 32) -> (16.0426, 32) projected
  line L14 (16.0426, 32) -> (16.0426, 34.2) projected
  line L15 (16.0426, 34.2) -> (21.2426, 34.2) projected
  line L16 (5.4463, 9.1) -> (5.4463, 6.9) projected
  line L17 (5.4463, 6.9) -> (0.2463, 6.9) projected
  line L18 (0.2463, 6.9) -> (0.2463, 9.1) projected
  line L19 (0.2463, 9.1) -> (5.4463, 9.1) projected
  line L20 (21.3852, 41.1) -> (15.6926, 41.1) projected
  line L21 (15.6926, 41.1) -> (15.6926, 47.1) projected
  line L22 (5.6926, 47.1) -> (15.6926, 47.1) projected
  line L23 (5.6926, 41.1) -> (5.6926, 47.1) projected
  line L24 (5.6926, 41.1) -> (0, 41.1) projected
  line L25 (0, 41.1) -> (0, 0) projected
  line L26 (5.6926, 0) -> (0, 0) projected
  line L27 (5.6926, 0) -> (5.6926, -6) projected
  line L28 (15.6926, -6) -> (5.6926, -6) projected
  line L29 (15.6926, 0) -> (15.6926, -6) projected
  line L30 (21.3852, 0) -> (15.6926, 0) projected
  line L31 (21.3852, 41.1) -> (21.3852, 0) projected
  line L32 (21.5926, 41.1) -> (21.5926, 0) projected
  line L33 (21.5926, 0) -> (27.5926, 0) projected
  line L34 (27.5926, 41.1) -> (27.5926, 0) projected
  line L35 (21.5926, 41.1) -> (27.5926, 41.1) projected
  line L36 (0, 41.1) -> (-0.2074, 41.1)
  line L37 (-0.2074, 41.1) -> (-0.2074, 0)
  line L38 (-0.2074, 0) -> (0, 0)
  line L39 (0, 0) -> (0, 41.1)
  line L40 (21.3852, 0) -> (21.5926, 0)
  line L41 (21.5926, 0) -> (21.5926, 41.1)
  line L42 (21.5926, 41.1) -> (21.3852, 41.1)
  line L43 (21.3852, 41.1) -> (21.3852, 0)
  point P0 (-9.4881, 41.1)
extrude "돌출16" add sketch "스케치16" against normal blind 6 contours L0 L36 L25 L38 | L31 L42 L32 L40
properties part number "bridge_hands1" material "PMMA 플라스틱"
